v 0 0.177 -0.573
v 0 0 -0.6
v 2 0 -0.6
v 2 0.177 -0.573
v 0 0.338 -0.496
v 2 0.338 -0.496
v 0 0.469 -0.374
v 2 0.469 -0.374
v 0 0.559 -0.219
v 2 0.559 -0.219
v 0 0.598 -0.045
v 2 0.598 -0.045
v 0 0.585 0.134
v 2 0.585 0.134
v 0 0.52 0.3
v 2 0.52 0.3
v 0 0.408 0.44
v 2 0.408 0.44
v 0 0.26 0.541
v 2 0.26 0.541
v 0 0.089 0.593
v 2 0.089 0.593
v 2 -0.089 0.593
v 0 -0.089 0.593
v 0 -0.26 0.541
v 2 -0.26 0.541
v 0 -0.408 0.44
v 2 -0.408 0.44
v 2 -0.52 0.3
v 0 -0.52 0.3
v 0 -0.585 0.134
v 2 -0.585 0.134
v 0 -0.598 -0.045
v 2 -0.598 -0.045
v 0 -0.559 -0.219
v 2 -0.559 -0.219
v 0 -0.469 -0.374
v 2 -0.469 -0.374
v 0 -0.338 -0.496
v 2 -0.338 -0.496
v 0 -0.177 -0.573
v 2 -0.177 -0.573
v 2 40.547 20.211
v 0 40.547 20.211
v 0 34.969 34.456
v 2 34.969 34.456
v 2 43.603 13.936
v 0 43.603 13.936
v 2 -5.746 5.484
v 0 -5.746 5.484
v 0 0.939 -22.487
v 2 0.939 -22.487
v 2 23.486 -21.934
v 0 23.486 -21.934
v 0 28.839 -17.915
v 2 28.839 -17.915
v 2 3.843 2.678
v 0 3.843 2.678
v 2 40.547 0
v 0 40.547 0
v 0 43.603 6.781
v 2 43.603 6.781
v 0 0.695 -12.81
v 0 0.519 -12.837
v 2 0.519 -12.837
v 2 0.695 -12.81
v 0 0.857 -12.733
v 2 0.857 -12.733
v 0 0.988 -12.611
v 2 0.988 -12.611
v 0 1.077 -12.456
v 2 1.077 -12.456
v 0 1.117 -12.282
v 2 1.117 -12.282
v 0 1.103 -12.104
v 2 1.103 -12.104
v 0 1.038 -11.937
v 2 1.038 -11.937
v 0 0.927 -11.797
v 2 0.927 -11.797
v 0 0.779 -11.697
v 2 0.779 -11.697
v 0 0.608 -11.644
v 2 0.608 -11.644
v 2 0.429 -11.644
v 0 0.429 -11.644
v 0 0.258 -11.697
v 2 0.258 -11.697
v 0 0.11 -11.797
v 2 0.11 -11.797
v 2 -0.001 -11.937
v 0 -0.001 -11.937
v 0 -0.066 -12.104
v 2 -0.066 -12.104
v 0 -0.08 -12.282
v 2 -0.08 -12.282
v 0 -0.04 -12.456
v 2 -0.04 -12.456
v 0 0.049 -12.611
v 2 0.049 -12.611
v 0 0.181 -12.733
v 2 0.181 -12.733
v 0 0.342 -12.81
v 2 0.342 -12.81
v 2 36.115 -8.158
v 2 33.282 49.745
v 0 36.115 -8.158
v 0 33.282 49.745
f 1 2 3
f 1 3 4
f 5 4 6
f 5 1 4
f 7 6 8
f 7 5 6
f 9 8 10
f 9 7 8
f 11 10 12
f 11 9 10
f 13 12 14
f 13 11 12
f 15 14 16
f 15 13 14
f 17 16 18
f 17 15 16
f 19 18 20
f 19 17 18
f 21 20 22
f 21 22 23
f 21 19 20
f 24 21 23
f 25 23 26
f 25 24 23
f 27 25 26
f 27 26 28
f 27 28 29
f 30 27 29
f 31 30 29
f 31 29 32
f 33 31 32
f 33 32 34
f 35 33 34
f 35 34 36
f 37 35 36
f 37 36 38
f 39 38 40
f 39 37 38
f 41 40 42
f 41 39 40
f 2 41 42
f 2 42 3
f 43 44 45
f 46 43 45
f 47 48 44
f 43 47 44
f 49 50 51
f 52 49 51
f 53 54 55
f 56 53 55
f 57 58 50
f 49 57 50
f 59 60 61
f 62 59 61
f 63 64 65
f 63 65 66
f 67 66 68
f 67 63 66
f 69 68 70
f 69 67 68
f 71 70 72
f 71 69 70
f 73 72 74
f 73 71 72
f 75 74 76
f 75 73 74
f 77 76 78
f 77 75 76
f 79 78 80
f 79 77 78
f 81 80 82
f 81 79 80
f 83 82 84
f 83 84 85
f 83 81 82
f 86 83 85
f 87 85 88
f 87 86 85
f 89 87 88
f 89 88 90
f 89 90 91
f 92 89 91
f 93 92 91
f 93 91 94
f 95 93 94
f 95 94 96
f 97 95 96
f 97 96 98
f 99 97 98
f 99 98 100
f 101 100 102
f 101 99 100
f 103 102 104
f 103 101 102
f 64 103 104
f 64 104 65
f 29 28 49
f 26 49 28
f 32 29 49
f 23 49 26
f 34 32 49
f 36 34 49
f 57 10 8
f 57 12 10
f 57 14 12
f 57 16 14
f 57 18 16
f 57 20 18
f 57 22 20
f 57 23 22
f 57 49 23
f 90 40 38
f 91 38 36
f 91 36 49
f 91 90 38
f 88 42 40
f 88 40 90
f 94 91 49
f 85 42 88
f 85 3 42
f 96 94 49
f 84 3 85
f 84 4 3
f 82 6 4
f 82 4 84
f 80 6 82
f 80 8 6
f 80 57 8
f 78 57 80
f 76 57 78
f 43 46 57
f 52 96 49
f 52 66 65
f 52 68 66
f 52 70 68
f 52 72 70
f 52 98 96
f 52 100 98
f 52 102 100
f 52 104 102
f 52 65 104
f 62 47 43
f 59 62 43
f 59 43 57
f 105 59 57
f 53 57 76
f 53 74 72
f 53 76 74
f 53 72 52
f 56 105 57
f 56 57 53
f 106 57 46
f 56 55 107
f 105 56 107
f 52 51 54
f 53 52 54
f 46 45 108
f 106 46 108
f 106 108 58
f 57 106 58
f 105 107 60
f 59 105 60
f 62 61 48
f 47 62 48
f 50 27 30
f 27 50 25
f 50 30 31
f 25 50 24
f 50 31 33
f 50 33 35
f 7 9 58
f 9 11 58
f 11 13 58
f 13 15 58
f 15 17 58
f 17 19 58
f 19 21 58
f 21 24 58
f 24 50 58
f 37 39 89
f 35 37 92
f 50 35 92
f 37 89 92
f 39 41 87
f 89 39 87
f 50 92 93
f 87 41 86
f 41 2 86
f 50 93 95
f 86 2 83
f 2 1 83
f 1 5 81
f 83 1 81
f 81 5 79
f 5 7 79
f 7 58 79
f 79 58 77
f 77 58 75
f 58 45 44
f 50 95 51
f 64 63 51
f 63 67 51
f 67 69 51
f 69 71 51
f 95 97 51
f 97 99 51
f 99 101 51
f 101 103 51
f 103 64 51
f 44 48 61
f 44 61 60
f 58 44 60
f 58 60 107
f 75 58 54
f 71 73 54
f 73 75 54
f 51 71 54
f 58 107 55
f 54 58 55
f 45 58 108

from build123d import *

# Parameters (mm, degrees)
SKETCH_1_R      = 0.6
EXTRUDE_1_DEPTH = 2


with BuildPart() as part:
    # 草图1 → 凸台-拉伸1 (new body)
    with BuildSketch(Plane(origin=(0, 0, 0), x_dir=(0, 0, -1), z_dir=(1, 0, 0))):
        Polygon((-5.483662069, -5.746212595), (22.48689596, 0.939195285), (21.934471639, 23.485878838), (17.91469757, 28.839240511), (8.158406363, 36.115117525), (0, 40.546620882), (-6.780914547, 43.602624476), (-13.936136859, 43.602624476), (-20.210913974, 40.546620882), (-34.455547379, 34.968652147), (-49.745371225, 33.281638151), (-2.678378839, 3.842593198), align=None)
        Circle(SKETCH_1_R, mode=Mode.SUBTRACT)
        with Locations((12.23711119, 0.518510559)):
            Circle(SKETCH_1_R, mode=Mode.SUBTRACT)
    extrude(amount=EXTRUDE_1_DEPTH)


solid = part.part
